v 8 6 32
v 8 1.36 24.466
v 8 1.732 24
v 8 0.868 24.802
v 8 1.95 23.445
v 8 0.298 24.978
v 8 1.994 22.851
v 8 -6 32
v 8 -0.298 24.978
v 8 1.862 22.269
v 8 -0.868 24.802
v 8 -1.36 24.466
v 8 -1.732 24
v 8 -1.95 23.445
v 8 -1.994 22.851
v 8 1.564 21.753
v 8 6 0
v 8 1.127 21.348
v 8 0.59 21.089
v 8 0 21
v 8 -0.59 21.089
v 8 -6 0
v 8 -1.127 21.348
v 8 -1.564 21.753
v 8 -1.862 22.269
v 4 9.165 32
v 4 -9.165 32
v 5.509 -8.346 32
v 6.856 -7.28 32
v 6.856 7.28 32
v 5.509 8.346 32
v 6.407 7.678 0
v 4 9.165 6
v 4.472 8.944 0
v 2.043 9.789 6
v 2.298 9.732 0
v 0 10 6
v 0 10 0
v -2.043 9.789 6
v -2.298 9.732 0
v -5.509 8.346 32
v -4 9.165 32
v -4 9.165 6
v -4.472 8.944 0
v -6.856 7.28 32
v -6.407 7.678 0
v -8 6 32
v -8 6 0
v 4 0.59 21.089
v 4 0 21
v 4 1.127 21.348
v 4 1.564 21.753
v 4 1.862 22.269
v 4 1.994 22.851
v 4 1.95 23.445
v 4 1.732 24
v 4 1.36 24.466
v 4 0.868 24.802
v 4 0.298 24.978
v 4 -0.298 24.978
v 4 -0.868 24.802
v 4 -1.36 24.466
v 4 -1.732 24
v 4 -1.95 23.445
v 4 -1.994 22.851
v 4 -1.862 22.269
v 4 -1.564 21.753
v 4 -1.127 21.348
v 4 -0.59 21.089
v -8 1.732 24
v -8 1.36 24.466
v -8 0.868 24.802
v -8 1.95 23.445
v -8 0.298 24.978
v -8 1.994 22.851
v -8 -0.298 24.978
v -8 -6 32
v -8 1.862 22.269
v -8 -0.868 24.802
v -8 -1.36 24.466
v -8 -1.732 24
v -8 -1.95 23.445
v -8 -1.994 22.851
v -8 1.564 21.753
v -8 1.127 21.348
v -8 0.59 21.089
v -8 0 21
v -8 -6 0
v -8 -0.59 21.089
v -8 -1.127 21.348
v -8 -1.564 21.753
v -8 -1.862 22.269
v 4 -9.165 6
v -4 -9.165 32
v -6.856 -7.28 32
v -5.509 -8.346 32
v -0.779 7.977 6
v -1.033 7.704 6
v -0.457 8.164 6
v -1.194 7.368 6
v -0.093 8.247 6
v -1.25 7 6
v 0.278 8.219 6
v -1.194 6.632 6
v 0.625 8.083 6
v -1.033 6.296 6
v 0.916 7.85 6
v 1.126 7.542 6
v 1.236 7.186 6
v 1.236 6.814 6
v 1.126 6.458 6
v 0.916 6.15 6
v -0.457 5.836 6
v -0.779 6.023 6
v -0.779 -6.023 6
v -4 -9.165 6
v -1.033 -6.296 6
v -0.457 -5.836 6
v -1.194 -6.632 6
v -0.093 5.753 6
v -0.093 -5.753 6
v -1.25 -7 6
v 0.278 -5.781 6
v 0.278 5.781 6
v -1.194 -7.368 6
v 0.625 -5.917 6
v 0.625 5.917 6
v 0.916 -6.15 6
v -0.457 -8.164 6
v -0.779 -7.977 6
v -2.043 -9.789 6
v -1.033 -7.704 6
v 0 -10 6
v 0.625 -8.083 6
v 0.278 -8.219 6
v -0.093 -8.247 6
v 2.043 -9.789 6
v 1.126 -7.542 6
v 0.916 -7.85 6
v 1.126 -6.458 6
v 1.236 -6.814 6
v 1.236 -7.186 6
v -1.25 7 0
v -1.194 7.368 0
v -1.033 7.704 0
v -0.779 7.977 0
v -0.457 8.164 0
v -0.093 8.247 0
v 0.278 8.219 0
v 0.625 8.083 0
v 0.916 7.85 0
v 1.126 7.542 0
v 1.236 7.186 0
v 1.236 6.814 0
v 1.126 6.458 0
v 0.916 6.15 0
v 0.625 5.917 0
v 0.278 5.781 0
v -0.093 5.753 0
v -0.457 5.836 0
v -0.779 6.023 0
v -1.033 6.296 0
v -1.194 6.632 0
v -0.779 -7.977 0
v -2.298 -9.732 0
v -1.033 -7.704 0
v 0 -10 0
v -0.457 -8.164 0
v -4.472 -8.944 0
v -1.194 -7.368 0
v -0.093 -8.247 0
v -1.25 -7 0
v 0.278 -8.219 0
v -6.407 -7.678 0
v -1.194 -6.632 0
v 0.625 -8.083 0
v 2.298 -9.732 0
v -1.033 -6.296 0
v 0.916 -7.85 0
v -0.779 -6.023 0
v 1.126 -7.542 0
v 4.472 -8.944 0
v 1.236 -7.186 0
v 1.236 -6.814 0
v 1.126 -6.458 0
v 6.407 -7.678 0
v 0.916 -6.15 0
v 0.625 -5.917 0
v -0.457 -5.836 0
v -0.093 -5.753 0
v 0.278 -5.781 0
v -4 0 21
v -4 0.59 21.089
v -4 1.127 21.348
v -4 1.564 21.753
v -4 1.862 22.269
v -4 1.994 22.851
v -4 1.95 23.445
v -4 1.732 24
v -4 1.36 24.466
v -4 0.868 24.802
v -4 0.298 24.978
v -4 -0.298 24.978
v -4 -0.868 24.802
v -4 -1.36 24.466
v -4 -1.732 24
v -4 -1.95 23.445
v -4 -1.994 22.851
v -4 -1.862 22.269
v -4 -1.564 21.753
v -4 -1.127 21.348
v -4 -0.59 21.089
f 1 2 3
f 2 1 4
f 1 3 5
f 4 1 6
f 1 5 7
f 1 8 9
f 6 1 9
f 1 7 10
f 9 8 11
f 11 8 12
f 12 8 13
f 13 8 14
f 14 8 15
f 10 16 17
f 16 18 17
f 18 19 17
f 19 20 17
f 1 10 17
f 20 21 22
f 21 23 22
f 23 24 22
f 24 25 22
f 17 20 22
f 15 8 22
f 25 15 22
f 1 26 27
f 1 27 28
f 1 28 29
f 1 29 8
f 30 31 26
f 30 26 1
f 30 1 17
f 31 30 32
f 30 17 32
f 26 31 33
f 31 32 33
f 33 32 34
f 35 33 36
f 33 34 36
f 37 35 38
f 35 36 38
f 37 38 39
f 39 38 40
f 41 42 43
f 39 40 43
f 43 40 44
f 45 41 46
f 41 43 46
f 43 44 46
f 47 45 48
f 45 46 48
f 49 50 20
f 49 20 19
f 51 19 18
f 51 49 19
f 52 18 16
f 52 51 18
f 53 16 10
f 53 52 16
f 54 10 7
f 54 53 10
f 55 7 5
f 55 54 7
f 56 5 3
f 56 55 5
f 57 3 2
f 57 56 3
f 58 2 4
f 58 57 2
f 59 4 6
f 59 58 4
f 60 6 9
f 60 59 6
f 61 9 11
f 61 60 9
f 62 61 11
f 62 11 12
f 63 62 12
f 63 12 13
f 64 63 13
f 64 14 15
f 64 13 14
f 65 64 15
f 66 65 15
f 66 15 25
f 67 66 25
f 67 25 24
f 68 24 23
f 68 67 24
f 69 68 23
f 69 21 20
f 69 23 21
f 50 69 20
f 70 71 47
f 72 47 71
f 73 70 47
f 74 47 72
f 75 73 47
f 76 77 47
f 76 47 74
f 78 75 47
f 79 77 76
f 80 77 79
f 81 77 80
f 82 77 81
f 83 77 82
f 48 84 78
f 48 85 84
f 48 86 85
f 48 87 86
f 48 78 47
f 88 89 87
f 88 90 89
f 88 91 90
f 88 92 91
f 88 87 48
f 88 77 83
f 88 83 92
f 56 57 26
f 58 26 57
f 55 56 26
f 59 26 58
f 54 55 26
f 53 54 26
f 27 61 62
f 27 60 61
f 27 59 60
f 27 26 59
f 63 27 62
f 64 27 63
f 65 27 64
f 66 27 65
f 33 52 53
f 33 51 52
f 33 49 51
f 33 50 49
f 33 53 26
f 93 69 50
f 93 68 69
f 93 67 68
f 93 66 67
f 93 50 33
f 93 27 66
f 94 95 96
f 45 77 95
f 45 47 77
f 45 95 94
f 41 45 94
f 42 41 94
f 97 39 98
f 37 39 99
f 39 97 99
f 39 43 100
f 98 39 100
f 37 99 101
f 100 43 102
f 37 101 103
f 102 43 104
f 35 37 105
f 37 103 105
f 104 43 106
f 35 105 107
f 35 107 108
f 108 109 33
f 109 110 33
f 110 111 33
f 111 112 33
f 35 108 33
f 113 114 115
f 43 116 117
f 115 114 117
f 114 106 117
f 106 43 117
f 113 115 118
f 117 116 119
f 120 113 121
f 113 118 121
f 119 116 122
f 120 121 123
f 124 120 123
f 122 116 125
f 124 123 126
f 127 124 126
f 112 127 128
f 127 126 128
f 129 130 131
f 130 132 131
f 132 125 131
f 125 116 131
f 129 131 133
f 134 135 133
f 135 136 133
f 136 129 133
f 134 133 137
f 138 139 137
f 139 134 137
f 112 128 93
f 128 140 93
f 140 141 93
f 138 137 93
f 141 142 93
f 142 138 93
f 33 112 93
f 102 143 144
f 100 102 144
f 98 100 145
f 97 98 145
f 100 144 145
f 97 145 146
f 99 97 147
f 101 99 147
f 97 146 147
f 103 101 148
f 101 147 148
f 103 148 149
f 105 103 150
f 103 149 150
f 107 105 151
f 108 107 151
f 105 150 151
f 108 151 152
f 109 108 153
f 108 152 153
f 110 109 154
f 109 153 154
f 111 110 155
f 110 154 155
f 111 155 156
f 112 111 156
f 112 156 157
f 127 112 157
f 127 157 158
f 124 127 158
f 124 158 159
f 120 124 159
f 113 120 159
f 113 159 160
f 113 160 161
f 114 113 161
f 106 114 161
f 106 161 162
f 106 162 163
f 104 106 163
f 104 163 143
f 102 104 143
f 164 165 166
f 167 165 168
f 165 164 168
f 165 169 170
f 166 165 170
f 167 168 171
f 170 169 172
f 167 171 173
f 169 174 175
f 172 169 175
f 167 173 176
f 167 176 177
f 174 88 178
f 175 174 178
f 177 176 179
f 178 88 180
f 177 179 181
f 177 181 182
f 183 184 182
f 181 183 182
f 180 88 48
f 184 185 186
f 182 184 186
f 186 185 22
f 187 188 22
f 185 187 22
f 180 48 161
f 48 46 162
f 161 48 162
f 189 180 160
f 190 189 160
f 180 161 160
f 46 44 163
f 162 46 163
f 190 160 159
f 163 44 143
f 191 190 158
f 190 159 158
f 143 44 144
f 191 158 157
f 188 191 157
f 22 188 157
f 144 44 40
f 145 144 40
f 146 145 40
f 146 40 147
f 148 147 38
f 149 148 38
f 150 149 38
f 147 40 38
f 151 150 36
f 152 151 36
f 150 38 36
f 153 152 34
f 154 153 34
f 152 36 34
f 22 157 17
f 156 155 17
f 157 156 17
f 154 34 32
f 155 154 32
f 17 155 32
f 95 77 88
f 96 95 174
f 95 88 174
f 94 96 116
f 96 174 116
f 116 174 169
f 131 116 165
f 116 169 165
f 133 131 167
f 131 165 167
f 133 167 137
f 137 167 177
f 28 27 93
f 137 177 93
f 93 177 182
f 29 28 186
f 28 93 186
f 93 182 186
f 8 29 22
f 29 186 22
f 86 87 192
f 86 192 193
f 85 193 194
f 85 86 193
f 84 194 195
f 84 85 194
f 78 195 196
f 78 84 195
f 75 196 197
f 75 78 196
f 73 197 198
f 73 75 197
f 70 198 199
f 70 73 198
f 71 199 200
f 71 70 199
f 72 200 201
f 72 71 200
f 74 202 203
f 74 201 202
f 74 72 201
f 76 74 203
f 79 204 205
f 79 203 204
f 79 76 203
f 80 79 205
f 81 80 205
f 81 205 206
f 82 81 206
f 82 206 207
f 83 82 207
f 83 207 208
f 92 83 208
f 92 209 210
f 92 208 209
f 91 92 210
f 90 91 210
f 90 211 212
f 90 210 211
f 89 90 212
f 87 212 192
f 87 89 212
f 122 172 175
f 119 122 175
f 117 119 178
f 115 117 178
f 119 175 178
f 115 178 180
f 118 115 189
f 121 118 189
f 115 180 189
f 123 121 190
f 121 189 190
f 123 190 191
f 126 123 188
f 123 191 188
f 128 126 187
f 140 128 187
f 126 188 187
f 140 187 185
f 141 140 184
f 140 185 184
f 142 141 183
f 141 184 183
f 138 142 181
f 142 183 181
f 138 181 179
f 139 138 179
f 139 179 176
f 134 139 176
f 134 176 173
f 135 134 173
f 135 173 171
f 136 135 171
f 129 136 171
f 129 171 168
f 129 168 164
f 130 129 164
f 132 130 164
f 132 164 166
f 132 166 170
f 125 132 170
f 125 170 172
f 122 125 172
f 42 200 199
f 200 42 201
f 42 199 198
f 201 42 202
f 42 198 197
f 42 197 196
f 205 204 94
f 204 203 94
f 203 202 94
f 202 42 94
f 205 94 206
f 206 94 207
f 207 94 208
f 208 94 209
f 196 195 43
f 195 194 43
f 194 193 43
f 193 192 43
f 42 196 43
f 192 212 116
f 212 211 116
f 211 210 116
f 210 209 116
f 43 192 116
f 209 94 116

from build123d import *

# Parameters (mm, degrees)
SKETCH_1_R               = 10
EXTRUDE_2_DEPTH          = 32
CUT_EXTRUDE_1_DEPTH      = 35.985711369
CUT_EXTRUDE_1_DEPTH_BACK = 35.985711369
SKETCH_3_W               = 8
SKETCH_3_H               = 26
CUT_EXTRUDE_2_DEPTH      = 35.985711369
CUT_EXTRUDE_2_DEPTH_BACK = 35.985711369
SKETCH_4_W               = 2
SKETCH_4_H               = 32
SKETCH_5_R               = 1.25
CUT_EXTRUDE_3_DEPTH      = 35.467375879
CUT_EXTRUDE_4_DEPTH      = 35.467375879
CUT_EXTRUDE_4_DEPTH_BACK = 35.467375879
SKETCH_6_R               = 2


with BuildPart() as part:
    # 草图1 → 凸台-拉伸2 (new body)
    with BuildSketch(Plane.XY):
        Circle(SKETCH_1_R)
    extrude(amount=EXTRUDE_2_DEPTH)

    # 草图3 → 切除-拉伸1 (cut, two sides: drawn at the far end of the back side and taken through both)
    with BuildSketch(Plane(origin=(0, 0, 0), x_dir=(1, 0, 0), z_dir=(0, 1, 0)).offset(-CUT_EXTRUDE_1_DEPTH_BACK)):
        with Locations((0, -19)):
            Rectangle(SKETCH_3_W, SKETCH_3_H)
    extrude(amount=CUT_EXTRUDE_1_DEPTH + CUT_EXTRUDE_1_DEPTH_BACK, mode=Mode.SUBTRACT)

    # 草图4 → 切除-拉伸2 (cut, two sides: drawn at the far end of the back side and taken through both)
    with BuildSketch(Plane(origin=(0, 0, 0), x_dir=(1, 0, 0), z_dir=(0, 1, 0)).offset(-CUT_EXTRUDE_2_DEPTH_BACK)):
        with Locations((-9, -16)):
            Rectangle(SKETCH_4_W, SKETCH_4_H)
        with Locations((9, -16)):
            Rectangle(SKETCH_4_W, SKETCH_4_H)
    extrude(amount=CUT_EXTRUDE_2_DEPTH + CUT_EXTRUDE_2_DEPTH_BACK, mode=Mode.SUBTRACT)

    # 草图5 → 切除-拉伸3 (cut, through all)
    with BuildSketch(Plane(origin=(0, 0, 0), x_dir=(-1, 0, 0), z_dir=(0, 0, -1))):
        with Locations((0, 7)):
            Circle(SKETCH_5_R)
        with Locations((0, -7)):
            Circle(SKETCH_5_R)
    extrude(amount=-CUT_EXTRUDE_3_DEPTH, mode=Mode.SUBTRACT)

    # 草图6 → 切除-拉伸4 (cut, two sides: drawn at the far end of the back side and taken through both)
    with BuildSketch(Plane(origin=(0, 0, 0), x_dir=(0, 0, -1), z_dir=(1, 0, 0)).offset(-CUT_EXTRUDE_4_DEPTH_BACK)):
        with Locations((-23, 0)):
            Circle(SKETCH_6_R)
    extrude(amount=CUT_EXTRUDE_4_DEPTH + CUT_EXTRUDE_4_DEPTH_BACK, mode=Mode.SUBTRACT)


solid = part.part
